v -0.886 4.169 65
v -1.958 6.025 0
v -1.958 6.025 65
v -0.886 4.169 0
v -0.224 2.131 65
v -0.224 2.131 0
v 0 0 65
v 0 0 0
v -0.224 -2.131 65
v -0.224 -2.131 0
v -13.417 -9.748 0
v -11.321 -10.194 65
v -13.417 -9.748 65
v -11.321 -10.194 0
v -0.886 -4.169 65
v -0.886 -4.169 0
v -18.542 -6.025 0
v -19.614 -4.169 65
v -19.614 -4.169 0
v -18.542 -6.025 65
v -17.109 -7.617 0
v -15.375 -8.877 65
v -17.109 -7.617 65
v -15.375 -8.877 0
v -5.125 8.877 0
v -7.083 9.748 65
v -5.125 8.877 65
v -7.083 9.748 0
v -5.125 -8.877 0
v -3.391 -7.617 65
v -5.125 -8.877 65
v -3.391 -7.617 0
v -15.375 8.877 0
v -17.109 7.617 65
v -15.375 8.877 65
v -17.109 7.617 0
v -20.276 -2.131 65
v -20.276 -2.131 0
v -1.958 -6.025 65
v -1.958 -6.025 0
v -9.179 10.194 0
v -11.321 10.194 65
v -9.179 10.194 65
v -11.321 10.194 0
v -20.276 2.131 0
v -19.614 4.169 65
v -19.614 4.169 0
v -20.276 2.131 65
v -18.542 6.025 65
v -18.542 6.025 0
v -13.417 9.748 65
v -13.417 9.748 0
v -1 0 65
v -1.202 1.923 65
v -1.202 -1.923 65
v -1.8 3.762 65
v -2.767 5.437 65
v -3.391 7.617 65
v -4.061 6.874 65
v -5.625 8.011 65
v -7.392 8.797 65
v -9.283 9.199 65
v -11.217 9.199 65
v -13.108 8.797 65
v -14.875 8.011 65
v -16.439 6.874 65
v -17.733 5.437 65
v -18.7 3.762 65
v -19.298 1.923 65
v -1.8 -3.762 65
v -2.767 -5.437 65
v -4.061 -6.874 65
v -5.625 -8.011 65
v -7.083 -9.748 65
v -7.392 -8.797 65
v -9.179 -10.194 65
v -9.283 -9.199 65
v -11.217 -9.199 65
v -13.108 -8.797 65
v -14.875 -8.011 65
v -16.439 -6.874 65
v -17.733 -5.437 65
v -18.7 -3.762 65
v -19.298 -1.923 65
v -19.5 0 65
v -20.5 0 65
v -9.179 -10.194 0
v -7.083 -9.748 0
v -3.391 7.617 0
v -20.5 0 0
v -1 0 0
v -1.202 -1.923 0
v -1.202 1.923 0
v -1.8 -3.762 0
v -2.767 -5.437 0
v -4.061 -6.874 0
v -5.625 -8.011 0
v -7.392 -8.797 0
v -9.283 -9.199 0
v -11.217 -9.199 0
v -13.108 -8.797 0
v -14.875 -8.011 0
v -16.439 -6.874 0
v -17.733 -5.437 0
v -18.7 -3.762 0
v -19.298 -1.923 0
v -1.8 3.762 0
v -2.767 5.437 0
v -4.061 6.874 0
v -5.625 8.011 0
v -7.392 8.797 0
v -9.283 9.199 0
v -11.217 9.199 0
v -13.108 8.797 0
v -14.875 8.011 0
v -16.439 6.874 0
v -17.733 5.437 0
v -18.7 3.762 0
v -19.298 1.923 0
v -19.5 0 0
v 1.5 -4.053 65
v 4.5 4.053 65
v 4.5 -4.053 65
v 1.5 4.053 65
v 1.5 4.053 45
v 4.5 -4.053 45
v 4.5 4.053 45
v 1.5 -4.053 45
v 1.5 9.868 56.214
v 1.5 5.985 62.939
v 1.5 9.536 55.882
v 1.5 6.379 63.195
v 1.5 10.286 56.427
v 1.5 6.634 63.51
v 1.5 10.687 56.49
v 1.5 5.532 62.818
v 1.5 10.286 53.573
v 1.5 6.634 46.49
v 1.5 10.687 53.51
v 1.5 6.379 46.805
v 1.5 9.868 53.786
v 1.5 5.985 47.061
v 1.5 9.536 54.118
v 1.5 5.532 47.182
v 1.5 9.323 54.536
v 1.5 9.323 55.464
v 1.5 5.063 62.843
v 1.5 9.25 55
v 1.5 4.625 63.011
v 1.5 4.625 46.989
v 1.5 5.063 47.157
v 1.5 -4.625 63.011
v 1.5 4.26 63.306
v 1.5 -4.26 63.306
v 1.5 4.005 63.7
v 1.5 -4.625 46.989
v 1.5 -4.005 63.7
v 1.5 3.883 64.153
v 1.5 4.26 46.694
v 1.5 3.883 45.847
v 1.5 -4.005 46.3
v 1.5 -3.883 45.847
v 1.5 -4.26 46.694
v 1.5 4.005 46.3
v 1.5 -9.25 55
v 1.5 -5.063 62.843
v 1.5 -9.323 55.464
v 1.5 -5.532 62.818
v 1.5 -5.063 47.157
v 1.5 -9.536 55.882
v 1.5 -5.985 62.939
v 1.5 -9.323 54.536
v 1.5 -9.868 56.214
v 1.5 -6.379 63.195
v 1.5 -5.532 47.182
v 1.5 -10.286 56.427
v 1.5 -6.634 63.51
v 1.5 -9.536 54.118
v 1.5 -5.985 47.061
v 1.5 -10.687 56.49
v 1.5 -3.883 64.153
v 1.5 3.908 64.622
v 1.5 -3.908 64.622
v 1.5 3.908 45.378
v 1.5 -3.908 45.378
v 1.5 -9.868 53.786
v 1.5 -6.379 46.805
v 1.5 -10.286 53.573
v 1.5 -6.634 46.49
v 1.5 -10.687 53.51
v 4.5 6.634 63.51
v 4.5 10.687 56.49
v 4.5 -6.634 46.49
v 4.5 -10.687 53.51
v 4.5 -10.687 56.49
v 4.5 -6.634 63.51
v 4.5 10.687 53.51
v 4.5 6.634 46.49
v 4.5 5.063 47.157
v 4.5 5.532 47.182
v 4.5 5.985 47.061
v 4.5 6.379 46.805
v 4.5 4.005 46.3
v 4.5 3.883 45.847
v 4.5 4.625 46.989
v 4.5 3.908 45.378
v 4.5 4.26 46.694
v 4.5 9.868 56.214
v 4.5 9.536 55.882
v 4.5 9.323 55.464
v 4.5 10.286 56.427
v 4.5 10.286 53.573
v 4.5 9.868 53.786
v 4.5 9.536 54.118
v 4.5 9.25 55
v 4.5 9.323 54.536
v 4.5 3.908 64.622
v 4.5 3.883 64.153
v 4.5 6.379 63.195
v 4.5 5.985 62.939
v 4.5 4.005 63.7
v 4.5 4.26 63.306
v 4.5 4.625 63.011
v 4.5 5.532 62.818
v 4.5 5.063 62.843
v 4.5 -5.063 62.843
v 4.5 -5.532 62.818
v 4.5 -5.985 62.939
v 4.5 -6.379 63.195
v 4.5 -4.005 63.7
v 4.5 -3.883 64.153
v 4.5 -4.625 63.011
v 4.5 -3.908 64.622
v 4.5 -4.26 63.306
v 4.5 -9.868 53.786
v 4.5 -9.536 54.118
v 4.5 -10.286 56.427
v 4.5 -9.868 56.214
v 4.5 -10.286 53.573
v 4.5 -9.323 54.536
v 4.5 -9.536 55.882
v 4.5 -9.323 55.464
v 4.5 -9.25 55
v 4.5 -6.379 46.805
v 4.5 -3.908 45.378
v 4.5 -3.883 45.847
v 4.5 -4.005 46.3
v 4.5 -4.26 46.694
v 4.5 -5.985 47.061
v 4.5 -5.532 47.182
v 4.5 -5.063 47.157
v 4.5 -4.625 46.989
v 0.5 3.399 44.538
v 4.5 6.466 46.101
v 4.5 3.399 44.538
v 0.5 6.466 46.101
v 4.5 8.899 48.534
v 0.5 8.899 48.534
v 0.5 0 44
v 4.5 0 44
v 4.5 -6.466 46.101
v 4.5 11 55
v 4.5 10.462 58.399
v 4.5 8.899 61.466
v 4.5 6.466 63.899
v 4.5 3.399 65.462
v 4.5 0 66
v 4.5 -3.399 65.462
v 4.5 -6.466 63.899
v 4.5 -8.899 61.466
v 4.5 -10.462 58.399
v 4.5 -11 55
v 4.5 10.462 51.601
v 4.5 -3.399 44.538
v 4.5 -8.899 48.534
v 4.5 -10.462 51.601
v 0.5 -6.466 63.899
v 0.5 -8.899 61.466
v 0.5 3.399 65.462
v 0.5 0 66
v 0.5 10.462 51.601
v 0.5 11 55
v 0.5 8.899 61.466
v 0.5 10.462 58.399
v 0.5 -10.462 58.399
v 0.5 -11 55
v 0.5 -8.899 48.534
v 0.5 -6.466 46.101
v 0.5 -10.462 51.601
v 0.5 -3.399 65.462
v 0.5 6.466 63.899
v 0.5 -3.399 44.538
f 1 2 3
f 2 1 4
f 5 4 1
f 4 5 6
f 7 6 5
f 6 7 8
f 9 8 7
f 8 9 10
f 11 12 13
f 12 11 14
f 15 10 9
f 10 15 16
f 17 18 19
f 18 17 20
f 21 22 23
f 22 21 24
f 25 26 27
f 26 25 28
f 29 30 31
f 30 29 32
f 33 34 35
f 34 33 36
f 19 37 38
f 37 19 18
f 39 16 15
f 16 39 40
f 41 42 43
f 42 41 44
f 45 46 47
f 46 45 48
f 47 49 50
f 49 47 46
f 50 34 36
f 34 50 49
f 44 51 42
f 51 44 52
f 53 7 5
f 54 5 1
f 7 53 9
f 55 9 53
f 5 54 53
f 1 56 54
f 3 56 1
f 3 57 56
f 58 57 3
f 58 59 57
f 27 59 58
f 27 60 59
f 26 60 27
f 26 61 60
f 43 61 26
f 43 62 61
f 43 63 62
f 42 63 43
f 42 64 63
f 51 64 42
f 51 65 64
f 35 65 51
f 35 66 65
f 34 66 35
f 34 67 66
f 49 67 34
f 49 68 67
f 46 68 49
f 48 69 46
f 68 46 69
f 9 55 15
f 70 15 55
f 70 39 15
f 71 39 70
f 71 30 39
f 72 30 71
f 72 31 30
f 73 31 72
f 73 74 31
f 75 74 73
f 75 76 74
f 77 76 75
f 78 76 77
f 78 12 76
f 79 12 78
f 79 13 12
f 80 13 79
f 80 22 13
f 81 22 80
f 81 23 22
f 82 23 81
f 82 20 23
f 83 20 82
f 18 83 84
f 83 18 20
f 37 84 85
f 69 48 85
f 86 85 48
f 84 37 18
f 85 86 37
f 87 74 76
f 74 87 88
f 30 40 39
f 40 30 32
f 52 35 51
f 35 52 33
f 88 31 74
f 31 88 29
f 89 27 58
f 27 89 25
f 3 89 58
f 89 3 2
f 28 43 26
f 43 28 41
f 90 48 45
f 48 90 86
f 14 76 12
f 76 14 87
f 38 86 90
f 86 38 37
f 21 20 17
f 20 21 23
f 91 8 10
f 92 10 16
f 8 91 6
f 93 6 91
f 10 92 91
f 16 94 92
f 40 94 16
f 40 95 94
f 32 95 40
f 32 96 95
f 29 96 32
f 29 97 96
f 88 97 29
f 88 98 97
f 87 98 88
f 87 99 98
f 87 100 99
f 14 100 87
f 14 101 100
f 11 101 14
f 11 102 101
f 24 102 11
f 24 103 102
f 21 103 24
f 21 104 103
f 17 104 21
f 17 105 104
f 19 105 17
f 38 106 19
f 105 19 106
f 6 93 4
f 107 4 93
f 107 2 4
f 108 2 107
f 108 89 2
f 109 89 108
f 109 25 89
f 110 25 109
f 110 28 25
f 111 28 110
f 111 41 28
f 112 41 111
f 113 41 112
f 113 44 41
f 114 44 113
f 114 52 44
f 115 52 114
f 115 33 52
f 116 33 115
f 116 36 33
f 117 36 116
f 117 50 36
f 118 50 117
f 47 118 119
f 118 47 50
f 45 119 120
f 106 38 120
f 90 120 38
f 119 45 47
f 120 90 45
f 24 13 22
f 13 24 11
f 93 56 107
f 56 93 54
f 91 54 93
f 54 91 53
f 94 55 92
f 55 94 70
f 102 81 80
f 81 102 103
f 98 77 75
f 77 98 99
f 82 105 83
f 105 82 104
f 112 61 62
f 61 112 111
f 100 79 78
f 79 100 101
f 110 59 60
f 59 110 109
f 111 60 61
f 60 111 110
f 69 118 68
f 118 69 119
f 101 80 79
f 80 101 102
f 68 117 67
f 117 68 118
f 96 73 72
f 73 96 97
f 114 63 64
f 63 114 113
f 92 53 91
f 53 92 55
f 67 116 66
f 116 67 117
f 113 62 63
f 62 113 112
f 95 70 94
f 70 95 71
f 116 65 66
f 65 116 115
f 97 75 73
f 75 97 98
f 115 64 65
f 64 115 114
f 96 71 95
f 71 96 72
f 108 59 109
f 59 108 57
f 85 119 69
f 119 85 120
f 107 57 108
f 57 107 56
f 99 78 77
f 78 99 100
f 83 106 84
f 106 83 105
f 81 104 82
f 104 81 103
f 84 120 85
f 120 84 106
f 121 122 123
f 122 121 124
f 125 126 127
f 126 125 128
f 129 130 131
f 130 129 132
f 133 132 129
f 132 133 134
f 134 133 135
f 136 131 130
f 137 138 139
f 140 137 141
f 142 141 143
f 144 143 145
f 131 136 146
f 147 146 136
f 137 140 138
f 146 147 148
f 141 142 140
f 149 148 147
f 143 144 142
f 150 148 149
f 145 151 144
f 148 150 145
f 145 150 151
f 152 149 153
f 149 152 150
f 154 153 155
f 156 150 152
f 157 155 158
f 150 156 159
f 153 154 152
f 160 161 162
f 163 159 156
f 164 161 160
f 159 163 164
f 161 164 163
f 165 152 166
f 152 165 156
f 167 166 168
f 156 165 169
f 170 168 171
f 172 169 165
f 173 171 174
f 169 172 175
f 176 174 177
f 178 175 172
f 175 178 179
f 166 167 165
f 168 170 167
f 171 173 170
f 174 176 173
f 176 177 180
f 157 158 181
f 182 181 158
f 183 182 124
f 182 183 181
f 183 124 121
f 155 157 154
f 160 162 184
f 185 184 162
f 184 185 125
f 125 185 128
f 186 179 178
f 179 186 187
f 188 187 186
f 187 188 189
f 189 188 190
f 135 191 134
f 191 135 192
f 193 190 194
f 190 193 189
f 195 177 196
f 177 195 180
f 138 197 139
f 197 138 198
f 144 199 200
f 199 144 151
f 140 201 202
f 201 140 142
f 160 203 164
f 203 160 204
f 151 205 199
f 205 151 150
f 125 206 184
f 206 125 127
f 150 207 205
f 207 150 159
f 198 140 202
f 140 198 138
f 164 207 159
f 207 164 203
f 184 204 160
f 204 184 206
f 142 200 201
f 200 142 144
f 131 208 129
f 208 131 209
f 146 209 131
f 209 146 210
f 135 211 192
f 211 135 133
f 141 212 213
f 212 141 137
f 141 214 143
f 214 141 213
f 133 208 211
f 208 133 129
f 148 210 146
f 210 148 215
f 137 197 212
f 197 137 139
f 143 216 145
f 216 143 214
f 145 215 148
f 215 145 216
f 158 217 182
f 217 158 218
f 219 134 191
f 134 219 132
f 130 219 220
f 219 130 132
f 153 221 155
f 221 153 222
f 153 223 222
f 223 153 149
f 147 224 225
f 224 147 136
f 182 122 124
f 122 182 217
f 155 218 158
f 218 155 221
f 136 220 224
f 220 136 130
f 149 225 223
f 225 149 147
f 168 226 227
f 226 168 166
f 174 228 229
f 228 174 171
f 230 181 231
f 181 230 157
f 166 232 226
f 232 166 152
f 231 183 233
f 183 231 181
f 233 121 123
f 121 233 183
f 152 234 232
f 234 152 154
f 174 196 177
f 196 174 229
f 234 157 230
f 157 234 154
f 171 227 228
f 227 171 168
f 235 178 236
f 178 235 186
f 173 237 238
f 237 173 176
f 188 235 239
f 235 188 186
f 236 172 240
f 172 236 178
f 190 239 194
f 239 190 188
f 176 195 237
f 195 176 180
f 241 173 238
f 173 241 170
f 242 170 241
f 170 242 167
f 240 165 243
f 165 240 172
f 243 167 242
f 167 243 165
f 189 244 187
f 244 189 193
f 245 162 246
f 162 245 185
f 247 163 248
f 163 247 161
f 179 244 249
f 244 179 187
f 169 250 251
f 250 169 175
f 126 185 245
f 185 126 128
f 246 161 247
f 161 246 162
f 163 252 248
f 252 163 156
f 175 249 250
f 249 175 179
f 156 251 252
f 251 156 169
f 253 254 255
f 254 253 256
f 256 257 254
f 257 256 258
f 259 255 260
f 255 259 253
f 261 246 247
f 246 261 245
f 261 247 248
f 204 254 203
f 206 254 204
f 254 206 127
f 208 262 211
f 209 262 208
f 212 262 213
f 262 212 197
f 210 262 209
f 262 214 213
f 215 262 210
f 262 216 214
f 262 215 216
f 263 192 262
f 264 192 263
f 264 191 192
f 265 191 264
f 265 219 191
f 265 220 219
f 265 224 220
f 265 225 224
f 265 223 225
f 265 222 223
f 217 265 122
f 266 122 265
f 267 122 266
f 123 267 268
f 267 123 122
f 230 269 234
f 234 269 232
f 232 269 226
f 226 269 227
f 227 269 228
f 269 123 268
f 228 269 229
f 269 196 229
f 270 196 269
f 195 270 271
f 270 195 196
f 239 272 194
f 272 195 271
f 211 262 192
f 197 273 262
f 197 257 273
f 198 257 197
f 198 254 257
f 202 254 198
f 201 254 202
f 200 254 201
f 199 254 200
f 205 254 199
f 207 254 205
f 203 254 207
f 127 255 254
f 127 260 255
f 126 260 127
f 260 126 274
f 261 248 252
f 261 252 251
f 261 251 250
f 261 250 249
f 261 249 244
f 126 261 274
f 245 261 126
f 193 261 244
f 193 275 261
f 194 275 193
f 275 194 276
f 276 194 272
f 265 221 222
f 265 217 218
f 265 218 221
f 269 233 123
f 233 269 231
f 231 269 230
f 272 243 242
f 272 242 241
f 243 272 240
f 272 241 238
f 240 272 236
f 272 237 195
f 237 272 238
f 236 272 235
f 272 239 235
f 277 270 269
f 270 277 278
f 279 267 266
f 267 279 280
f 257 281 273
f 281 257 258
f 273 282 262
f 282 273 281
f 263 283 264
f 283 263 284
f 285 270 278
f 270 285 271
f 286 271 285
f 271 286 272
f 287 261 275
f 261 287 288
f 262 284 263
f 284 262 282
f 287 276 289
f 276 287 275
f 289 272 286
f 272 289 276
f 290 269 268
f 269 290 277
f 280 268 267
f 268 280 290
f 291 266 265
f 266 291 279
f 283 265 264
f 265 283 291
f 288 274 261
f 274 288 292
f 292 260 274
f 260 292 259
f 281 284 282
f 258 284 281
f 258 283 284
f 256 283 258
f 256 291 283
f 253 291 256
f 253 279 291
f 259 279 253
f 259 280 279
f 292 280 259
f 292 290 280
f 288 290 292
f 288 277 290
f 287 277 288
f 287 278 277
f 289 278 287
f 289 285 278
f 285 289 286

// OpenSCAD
// Configurable Settings
th=1;

// FYI:
// h_AA_battery = 50.5;
// r_AA_battery = 14.5/2;
// r_18650_battery = 18/2;
// h_18650_battery = 65;
h_battery = 65;
r_battery = 18.5/2;


r_led_star_6_side = 20/2;

h_led_star_6_side = 1;  // TODO
// derived configuration
ro_battery = r_battery + th;
h_led_star_holder = h_led_star_6_side + .5 + th + 1.5;



module _led_star(h=h_led_star_6_side){
  r_holder = 3/2;
  difference(){
    // hexagon
    union(){
      cube([h, 2*r_led_star_6_side/1.75, 2*r_led_star_6_side], center=true);
      rotate([-60,0,0])cube([h, 2*r_led_star_6_side/1.75, 2*r_led_star_6_side], center=true);
      rotate([60,0,0])cube([h, 2*r_led_star_6_side/1.75, 2*r_led_star_6_side], center=true);
    }
    rotate([0,90,0]) {
      for (d=[0:360/6:360-360/6]) {
        rotate([0,0,360/6/2 +d])translate([r_led_star_6_side+r_holder/2,0,0])
          cylinder(r=3/2, h=h+1, center=true, $fn=20);
      }
      /* cylinder(r=r_led_star_6_side, h=h, center=true, $fn=6); */
    }

  }
}
module _led_star_holder(){
  difference(){
    rotate([0,90,0])
      cylinder(r=r_led_star_6_side+th, h=h_led_star_holder, $fn=20);
    translate([h_led_star_holder/2+th,0,0])_led_star(h=h_led_star_holder);
  }
}

module _battery_cutout(){
  difference(){
    cylinder(r=ro_battery, h=h_battery, center=true);
    cylinder(r=r_battery, h=h_battery+1, center=true);
  }
}

// battery
translate([-ro_battery,0,h_battery/2])
  _battery_cutout();
  // led star
translate([h_led_star_6_side/2,0,h_battery-r_led_star_6_side])
  _led_star_holder();
